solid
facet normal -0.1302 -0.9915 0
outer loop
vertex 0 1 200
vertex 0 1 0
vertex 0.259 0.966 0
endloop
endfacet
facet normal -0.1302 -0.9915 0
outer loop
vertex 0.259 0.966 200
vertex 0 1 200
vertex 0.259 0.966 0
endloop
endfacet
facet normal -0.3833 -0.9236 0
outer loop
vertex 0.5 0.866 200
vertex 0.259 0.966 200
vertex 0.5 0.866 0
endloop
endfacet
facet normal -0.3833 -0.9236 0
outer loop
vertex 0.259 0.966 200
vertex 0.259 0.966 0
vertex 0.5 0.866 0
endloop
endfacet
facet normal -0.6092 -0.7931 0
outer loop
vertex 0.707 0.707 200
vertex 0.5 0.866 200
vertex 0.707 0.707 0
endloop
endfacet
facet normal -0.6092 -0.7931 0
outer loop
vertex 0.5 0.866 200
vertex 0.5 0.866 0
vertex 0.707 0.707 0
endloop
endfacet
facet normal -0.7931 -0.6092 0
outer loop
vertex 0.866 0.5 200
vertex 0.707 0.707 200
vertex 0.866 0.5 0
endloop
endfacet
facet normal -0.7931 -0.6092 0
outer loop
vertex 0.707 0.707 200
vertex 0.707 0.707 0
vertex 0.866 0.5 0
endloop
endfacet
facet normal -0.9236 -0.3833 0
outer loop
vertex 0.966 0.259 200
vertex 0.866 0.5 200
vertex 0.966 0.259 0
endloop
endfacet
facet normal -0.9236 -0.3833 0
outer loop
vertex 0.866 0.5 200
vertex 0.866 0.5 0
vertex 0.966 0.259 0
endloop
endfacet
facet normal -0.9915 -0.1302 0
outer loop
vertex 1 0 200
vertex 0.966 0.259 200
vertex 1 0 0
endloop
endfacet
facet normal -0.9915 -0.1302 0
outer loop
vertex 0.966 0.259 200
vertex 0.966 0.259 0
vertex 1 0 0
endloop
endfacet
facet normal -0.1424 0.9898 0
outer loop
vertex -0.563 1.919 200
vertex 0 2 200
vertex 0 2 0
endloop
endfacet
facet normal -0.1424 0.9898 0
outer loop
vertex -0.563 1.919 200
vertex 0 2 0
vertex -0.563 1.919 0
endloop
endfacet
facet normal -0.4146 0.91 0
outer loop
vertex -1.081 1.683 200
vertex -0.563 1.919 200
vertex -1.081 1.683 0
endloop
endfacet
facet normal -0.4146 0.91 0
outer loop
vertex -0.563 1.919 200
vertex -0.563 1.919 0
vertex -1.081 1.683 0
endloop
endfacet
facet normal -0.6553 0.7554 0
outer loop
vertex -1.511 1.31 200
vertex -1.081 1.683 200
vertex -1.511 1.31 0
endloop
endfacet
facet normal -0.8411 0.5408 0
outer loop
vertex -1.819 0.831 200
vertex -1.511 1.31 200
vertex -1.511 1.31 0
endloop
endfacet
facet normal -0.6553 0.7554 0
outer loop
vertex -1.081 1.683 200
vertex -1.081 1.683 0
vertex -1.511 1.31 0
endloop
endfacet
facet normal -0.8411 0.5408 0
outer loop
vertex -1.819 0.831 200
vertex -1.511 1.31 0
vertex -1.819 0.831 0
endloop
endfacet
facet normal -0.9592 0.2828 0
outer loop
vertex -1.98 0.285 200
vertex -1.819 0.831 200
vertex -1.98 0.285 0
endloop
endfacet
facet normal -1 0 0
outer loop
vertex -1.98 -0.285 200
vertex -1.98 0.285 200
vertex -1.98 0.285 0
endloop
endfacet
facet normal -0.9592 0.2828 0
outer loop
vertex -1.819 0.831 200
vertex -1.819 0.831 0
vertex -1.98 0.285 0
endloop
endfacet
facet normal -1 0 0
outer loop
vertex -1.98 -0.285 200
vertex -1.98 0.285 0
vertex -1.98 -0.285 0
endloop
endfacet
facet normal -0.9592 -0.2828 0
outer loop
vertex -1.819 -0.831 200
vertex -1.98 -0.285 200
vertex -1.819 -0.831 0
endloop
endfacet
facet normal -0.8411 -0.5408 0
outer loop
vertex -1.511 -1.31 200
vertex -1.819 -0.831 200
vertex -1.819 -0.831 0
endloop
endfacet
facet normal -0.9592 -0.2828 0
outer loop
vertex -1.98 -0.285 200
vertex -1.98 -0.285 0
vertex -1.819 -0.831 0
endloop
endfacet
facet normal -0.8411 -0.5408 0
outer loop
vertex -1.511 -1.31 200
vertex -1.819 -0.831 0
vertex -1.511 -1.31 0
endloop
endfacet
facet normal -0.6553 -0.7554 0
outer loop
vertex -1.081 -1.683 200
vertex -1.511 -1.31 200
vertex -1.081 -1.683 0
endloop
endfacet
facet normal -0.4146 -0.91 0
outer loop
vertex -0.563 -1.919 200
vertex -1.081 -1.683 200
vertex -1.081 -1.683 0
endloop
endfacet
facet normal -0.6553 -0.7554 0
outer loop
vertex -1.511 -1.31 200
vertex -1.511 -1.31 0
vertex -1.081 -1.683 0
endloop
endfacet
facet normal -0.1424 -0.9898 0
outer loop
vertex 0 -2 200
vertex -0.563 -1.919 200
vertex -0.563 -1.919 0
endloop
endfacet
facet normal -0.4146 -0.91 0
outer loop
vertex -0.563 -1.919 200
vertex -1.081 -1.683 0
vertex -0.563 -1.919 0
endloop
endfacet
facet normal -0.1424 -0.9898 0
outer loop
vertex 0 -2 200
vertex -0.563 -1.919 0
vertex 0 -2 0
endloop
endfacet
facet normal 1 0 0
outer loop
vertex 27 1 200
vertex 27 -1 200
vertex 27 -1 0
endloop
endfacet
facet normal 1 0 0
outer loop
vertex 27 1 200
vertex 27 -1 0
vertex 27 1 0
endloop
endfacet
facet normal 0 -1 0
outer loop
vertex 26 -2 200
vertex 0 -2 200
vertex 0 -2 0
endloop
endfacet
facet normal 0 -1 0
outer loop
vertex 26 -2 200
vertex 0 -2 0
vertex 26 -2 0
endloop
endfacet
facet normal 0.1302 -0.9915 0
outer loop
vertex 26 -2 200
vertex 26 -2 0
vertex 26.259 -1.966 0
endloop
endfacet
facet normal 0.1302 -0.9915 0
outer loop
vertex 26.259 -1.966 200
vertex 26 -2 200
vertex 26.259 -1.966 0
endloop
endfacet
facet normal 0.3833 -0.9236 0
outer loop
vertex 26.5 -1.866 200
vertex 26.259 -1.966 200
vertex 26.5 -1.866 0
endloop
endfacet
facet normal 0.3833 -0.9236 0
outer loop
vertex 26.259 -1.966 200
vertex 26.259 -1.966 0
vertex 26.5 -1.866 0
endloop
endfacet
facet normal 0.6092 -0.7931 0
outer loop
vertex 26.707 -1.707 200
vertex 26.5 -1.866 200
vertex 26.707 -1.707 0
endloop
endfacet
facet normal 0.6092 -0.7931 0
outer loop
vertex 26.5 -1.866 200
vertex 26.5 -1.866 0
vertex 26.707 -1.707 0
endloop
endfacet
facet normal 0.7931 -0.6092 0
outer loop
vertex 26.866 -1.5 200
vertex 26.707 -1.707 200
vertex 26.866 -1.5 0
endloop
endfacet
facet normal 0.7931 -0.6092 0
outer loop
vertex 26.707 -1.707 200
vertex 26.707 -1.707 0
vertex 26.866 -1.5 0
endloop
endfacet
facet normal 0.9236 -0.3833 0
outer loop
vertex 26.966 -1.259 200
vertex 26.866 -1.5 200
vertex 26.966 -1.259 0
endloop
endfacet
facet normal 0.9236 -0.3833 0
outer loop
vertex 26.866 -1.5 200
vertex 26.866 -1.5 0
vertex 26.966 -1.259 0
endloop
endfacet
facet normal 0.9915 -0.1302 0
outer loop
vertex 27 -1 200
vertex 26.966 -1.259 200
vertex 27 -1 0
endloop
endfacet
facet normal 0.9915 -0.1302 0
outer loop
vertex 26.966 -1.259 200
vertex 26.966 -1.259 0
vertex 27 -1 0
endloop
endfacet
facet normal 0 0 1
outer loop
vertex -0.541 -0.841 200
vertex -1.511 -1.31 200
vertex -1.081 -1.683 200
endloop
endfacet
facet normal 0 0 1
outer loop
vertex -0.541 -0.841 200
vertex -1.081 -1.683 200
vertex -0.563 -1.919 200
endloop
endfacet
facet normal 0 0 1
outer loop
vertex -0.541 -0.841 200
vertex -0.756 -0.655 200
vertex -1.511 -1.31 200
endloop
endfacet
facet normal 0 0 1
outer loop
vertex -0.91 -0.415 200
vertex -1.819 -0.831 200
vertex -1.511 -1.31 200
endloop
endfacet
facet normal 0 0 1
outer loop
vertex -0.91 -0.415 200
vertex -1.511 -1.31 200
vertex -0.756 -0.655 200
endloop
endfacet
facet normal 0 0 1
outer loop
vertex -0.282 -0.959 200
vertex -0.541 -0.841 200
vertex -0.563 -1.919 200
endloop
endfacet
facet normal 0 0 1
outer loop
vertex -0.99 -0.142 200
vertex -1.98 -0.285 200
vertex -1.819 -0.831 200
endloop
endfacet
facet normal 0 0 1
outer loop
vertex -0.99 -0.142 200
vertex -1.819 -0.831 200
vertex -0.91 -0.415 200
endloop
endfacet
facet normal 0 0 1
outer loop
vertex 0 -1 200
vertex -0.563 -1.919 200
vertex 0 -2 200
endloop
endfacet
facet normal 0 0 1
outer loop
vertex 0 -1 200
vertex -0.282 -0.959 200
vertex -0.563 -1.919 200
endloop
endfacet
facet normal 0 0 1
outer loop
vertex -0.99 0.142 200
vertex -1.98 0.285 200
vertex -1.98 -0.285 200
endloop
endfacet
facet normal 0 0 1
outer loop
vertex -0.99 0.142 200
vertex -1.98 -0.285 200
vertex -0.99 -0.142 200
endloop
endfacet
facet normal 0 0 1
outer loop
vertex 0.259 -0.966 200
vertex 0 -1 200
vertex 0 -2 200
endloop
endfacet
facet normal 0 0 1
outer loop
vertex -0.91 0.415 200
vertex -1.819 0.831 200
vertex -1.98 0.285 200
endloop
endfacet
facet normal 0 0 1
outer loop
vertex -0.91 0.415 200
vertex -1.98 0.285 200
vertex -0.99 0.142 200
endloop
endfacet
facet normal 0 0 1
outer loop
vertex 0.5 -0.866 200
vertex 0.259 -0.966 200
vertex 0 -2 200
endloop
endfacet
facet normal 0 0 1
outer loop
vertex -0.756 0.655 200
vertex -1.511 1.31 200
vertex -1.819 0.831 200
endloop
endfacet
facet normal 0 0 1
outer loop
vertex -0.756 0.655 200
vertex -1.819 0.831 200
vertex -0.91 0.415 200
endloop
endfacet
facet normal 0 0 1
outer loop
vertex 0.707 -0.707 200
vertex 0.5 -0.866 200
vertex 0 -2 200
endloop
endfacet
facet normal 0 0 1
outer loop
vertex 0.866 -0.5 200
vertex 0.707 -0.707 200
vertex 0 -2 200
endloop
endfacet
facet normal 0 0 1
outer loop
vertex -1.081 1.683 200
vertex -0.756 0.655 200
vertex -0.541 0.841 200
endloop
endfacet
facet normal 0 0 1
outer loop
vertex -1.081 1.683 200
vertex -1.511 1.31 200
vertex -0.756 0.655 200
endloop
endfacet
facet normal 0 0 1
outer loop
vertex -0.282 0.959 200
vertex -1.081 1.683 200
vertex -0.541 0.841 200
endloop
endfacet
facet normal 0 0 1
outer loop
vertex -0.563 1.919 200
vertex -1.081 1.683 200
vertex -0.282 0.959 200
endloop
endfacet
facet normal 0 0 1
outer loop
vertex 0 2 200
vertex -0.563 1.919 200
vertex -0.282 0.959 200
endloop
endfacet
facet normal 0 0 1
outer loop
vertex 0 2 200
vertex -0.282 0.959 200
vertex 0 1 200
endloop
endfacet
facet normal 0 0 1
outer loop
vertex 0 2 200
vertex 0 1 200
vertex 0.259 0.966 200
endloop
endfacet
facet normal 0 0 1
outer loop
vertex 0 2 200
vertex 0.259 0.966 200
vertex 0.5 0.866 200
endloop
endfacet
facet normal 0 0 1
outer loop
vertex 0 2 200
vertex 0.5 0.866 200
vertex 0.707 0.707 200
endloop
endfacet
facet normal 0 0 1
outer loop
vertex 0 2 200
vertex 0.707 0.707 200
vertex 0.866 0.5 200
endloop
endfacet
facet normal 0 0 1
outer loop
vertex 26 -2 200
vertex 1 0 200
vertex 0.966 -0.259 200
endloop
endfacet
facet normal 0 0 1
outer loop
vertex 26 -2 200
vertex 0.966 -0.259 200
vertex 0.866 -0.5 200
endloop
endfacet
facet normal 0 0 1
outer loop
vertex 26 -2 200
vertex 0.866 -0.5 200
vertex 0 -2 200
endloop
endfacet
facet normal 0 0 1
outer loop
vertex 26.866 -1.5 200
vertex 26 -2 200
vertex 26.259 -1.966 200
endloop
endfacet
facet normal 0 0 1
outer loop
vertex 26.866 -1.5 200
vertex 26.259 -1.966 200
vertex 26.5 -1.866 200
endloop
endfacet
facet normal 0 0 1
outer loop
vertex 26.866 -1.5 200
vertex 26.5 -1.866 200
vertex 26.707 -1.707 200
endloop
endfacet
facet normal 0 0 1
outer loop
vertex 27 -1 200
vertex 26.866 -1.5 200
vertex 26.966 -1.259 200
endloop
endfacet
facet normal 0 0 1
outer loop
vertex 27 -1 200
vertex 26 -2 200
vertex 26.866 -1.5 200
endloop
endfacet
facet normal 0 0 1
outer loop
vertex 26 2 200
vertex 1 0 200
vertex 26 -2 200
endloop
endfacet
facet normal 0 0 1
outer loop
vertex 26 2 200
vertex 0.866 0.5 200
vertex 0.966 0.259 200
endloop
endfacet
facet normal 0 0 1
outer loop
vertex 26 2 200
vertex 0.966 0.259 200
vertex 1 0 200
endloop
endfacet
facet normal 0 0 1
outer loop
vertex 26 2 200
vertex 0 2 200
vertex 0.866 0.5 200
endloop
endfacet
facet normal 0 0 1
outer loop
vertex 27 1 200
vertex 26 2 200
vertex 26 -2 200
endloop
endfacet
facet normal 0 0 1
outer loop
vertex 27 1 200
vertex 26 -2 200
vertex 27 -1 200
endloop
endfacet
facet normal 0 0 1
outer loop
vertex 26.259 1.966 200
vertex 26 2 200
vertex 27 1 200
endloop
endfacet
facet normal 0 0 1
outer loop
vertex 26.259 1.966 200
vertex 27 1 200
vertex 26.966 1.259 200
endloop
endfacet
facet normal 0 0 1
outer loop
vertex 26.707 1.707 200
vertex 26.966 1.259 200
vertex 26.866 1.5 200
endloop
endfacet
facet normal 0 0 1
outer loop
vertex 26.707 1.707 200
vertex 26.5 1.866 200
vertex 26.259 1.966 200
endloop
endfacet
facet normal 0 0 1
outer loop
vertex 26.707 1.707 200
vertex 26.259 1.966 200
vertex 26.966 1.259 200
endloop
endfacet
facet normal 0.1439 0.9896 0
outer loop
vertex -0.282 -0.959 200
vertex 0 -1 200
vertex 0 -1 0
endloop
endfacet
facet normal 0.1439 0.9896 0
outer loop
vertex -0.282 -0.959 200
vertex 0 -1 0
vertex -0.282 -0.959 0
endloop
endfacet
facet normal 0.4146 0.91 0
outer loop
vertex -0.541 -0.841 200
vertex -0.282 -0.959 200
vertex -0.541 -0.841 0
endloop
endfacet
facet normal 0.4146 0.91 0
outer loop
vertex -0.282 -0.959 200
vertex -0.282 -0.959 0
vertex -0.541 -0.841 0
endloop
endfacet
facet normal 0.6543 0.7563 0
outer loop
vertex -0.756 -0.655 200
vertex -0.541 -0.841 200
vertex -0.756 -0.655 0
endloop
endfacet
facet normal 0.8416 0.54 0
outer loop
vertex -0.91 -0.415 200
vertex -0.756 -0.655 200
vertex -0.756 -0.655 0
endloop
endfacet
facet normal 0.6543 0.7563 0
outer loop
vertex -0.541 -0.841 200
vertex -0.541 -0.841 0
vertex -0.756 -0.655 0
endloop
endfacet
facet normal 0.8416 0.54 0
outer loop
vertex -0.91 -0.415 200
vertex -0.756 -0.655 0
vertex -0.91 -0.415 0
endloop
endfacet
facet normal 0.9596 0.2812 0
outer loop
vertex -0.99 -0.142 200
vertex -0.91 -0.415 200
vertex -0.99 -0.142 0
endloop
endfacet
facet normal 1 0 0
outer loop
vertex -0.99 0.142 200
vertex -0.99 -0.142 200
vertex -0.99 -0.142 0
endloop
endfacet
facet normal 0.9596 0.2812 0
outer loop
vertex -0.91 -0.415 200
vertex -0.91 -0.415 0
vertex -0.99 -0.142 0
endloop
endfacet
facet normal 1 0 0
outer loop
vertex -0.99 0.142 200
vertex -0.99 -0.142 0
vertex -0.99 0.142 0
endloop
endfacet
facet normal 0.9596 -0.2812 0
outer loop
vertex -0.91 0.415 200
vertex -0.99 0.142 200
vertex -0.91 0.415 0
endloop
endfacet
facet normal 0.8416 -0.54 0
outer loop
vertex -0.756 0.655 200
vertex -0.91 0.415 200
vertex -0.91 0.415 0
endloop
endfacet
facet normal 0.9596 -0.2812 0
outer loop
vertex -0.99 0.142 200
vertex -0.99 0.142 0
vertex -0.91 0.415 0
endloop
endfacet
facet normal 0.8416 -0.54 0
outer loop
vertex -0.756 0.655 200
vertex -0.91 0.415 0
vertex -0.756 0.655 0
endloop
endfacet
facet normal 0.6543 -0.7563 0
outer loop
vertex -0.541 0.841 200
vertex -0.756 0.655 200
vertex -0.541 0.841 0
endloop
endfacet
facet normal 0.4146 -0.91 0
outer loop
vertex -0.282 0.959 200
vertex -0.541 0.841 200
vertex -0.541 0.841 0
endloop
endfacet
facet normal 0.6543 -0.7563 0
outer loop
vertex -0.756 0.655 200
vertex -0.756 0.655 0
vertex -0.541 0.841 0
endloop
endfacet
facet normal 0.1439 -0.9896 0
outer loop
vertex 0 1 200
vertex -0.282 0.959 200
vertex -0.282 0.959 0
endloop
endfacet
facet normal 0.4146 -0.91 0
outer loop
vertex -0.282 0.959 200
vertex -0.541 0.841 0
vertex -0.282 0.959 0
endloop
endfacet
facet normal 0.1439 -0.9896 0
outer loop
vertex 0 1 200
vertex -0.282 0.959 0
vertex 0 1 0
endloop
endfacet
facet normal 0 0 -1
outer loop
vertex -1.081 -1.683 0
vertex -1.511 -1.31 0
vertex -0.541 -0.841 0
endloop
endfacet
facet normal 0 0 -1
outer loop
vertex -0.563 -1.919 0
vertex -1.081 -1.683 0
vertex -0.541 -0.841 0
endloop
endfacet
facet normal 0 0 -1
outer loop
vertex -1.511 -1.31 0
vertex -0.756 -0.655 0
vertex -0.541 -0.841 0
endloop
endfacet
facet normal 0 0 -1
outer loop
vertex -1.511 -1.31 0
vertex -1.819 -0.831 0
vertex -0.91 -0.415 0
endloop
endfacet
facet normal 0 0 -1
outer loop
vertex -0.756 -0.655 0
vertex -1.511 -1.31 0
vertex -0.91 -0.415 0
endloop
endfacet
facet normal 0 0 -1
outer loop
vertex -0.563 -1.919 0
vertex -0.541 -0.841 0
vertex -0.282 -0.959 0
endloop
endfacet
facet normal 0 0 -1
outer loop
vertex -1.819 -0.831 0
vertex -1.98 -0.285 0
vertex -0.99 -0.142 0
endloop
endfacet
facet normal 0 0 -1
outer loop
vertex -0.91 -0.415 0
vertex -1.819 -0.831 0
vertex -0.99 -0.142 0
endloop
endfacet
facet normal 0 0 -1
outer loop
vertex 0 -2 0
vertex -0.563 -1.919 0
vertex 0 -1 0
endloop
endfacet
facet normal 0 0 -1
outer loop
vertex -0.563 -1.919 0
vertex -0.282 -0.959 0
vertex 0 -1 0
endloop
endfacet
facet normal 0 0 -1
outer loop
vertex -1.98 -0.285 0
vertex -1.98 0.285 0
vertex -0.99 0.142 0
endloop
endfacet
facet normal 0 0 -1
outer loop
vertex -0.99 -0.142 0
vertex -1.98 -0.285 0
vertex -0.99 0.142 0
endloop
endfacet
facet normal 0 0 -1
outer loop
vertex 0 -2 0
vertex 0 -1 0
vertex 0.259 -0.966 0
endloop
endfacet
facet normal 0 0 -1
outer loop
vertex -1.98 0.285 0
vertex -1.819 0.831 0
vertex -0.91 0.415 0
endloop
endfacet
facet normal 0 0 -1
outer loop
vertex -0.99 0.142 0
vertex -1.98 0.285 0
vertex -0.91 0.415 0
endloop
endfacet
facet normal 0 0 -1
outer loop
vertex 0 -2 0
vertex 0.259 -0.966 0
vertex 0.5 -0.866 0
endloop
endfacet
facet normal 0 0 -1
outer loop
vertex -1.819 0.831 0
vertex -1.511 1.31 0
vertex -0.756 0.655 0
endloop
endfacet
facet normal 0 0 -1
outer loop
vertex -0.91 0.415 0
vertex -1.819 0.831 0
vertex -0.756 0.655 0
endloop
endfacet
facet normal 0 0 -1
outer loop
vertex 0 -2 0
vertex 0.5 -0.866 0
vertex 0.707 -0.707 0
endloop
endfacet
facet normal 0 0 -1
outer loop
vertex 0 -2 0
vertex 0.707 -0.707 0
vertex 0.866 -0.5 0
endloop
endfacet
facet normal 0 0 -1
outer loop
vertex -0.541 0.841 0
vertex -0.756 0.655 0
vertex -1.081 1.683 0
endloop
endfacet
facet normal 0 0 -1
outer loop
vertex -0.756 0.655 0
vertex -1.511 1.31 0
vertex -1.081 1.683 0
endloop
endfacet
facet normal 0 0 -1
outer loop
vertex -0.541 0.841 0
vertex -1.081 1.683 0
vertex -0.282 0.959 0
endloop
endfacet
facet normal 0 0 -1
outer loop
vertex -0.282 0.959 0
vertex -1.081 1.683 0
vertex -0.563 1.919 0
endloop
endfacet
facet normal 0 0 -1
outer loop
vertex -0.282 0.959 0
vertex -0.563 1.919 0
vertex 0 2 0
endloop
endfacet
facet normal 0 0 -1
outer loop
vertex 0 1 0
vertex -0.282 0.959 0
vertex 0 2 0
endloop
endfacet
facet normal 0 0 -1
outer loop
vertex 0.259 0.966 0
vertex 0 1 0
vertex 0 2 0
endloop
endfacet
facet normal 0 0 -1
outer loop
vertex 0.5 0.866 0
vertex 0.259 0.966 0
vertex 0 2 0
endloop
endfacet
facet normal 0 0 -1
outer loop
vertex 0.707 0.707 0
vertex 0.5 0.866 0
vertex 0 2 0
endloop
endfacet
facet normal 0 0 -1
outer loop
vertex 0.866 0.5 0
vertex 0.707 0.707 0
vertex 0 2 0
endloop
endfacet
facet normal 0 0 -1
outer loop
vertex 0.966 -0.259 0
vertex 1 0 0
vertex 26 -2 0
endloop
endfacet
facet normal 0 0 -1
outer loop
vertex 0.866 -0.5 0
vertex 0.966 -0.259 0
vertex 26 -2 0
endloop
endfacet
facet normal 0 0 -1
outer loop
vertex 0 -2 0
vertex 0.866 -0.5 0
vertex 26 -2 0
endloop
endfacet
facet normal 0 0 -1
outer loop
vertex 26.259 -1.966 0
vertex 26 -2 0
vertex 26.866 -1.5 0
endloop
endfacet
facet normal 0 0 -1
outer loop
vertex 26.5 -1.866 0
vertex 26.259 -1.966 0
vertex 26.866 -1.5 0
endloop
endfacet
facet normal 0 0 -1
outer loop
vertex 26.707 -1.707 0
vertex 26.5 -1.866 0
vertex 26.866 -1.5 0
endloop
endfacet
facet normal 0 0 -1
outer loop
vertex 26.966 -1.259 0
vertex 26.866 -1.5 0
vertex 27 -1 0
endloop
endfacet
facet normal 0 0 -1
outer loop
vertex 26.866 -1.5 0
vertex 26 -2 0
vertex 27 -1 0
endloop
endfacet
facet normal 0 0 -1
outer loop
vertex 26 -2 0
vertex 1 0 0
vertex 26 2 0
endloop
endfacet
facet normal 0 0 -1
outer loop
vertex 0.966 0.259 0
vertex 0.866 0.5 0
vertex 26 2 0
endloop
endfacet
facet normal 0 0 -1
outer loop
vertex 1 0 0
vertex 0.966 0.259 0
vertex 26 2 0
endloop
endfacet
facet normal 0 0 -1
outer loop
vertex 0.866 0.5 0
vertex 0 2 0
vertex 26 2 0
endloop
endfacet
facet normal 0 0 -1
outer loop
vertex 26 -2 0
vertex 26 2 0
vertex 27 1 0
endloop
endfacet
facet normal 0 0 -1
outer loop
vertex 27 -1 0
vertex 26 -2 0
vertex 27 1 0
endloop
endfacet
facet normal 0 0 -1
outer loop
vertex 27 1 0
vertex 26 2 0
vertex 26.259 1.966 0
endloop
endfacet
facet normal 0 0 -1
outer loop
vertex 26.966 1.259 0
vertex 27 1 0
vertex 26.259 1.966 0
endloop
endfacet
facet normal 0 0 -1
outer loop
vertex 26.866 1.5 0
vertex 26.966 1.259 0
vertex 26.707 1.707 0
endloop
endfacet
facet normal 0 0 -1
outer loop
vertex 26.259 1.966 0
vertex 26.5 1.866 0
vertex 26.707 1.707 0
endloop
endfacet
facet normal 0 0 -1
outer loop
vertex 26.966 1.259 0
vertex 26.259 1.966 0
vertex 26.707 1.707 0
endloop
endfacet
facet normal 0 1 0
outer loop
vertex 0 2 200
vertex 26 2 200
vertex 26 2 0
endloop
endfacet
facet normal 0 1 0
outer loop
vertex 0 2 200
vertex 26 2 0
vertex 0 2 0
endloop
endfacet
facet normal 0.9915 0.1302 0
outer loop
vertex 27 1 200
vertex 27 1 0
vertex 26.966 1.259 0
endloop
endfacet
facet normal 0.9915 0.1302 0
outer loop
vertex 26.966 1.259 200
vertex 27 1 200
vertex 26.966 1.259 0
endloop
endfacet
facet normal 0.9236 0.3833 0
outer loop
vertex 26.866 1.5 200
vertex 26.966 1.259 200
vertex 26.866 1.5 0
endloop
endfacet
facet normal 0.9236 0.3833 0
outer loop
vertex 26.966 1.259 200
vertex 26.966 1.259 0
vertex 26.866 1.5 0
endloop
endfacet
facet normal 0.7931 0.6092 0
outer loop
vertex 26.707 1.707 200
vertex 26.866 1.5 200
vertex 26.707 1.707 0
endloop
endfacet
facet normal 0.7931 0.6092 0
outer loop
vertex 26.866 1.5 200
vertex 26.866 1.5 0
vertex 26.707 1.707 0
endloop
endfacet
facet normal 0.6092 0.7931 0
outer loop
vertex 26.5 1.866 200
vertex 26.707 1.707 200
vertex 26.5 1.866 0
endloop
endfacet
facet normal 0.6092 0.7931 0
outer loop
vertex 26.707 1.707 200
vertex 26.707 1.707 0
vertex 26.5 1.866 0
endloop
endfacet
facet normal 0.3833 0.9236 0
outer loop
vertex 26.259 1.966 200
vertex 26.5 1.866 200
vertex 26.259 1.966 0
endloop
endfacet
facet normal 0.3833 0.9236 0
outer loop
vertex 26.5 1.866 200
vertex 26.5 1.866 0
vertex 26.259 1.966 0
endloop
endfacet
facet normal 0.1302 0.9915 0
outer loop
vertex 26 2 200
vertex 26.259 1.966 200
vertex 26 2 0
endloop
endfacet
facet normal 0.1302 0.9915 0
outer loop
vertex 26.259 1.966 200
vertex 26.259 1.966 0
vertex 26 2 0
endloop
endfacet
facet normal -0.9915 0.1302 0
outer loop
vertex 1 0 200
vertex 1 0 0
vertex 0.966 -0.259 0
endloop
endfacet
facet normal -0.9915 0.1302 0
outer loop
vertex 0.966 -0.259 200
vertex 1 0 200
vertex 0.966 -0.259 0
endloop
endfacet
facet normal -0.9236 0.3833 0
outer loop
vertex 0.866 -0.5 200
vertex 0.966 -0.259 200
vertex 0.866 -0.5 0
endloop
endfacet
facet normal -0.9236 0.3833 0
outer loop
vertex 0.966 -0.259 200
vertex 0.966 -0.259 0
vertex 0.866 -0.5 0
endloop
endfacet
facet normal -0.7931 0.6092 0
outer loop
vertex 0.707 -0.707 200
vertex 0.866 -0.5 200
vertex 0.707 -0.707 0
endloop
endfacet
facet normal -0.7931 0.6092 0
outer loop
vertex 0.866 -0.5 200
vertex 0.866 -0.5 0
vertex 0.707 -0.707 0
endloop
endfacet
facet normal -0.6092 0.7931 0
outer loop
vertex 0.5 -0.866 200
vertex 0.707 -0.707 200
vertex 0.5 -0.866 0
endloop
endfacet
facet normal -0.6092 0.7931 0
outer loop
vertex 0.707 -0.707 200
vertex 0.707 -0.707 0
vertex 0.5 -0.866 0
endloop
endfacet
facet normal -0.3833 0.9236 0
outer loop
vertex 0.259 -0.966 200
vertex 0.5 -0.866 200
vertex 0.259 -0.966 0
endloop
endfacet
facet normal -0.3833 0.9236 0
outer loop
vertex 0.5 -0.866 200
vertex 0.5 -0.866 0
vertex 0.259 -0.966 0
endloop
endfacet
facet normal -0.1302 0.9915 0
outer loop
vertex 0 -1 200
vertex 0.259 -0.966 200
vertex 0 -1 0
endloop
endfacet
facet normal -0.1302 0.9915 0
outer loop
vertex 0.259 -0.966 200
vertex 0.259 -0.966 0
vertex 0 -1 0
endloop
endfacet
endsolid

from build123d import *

# Parameters (mm, degrees)
EXTRUDE_1_DEPTH = 200


with BuildPart() as part:
    # 草图1 → 凸台-拉伸1 (new body)
    with BuildSketch(Plane.XY):
        with BuildLine():
            ThreePointArc((0, 2), (-2, 0), (0, -2))
            Line((0, -2), (0, -1))
            ThreePointArc((0, -1), (-1, 0), (0, 1))
            Line((0, 1), (0, 2))
        make_face()
        with BuildLine():
            Line((0, -1), (0, -2))
            ThreePointArc((0, -2), (1.414213562, -1.414213562), (2, 0))
            ThreePointArc((2, 0), (1.414213562, 1.414213562), (0, 2))
            Line((0, 2), (0, 1))
            ThreePointArc((0, 1), (0.707106781, 0.707106781), (1, 0))
            ThreePointArc((1, 0), (0.707106781, -0.707106781), (0, -1))
        make_face()
        with BuildLine():
            ThreePointArc((2, 0), (1.414213562, -1.414213562), (0, -2))
            Line((0, -2), (26, -2))
            ThreePointArc((26, -2), (26.707106781, -1.707106781), (27, -1))
            Line((27, -1), (27, 1))
            ThreePointArc((27, 1), (26.707106781, 1.707106781), (26, 2))
            Line((26, 2), (0, 2))
            ThreePointArc((0, 2), (1.414213562, 1.414213562), (2, 0))
        make_face()
    extrude(amount=EXTRUDE_1_DEPTH)


solid = part.part
